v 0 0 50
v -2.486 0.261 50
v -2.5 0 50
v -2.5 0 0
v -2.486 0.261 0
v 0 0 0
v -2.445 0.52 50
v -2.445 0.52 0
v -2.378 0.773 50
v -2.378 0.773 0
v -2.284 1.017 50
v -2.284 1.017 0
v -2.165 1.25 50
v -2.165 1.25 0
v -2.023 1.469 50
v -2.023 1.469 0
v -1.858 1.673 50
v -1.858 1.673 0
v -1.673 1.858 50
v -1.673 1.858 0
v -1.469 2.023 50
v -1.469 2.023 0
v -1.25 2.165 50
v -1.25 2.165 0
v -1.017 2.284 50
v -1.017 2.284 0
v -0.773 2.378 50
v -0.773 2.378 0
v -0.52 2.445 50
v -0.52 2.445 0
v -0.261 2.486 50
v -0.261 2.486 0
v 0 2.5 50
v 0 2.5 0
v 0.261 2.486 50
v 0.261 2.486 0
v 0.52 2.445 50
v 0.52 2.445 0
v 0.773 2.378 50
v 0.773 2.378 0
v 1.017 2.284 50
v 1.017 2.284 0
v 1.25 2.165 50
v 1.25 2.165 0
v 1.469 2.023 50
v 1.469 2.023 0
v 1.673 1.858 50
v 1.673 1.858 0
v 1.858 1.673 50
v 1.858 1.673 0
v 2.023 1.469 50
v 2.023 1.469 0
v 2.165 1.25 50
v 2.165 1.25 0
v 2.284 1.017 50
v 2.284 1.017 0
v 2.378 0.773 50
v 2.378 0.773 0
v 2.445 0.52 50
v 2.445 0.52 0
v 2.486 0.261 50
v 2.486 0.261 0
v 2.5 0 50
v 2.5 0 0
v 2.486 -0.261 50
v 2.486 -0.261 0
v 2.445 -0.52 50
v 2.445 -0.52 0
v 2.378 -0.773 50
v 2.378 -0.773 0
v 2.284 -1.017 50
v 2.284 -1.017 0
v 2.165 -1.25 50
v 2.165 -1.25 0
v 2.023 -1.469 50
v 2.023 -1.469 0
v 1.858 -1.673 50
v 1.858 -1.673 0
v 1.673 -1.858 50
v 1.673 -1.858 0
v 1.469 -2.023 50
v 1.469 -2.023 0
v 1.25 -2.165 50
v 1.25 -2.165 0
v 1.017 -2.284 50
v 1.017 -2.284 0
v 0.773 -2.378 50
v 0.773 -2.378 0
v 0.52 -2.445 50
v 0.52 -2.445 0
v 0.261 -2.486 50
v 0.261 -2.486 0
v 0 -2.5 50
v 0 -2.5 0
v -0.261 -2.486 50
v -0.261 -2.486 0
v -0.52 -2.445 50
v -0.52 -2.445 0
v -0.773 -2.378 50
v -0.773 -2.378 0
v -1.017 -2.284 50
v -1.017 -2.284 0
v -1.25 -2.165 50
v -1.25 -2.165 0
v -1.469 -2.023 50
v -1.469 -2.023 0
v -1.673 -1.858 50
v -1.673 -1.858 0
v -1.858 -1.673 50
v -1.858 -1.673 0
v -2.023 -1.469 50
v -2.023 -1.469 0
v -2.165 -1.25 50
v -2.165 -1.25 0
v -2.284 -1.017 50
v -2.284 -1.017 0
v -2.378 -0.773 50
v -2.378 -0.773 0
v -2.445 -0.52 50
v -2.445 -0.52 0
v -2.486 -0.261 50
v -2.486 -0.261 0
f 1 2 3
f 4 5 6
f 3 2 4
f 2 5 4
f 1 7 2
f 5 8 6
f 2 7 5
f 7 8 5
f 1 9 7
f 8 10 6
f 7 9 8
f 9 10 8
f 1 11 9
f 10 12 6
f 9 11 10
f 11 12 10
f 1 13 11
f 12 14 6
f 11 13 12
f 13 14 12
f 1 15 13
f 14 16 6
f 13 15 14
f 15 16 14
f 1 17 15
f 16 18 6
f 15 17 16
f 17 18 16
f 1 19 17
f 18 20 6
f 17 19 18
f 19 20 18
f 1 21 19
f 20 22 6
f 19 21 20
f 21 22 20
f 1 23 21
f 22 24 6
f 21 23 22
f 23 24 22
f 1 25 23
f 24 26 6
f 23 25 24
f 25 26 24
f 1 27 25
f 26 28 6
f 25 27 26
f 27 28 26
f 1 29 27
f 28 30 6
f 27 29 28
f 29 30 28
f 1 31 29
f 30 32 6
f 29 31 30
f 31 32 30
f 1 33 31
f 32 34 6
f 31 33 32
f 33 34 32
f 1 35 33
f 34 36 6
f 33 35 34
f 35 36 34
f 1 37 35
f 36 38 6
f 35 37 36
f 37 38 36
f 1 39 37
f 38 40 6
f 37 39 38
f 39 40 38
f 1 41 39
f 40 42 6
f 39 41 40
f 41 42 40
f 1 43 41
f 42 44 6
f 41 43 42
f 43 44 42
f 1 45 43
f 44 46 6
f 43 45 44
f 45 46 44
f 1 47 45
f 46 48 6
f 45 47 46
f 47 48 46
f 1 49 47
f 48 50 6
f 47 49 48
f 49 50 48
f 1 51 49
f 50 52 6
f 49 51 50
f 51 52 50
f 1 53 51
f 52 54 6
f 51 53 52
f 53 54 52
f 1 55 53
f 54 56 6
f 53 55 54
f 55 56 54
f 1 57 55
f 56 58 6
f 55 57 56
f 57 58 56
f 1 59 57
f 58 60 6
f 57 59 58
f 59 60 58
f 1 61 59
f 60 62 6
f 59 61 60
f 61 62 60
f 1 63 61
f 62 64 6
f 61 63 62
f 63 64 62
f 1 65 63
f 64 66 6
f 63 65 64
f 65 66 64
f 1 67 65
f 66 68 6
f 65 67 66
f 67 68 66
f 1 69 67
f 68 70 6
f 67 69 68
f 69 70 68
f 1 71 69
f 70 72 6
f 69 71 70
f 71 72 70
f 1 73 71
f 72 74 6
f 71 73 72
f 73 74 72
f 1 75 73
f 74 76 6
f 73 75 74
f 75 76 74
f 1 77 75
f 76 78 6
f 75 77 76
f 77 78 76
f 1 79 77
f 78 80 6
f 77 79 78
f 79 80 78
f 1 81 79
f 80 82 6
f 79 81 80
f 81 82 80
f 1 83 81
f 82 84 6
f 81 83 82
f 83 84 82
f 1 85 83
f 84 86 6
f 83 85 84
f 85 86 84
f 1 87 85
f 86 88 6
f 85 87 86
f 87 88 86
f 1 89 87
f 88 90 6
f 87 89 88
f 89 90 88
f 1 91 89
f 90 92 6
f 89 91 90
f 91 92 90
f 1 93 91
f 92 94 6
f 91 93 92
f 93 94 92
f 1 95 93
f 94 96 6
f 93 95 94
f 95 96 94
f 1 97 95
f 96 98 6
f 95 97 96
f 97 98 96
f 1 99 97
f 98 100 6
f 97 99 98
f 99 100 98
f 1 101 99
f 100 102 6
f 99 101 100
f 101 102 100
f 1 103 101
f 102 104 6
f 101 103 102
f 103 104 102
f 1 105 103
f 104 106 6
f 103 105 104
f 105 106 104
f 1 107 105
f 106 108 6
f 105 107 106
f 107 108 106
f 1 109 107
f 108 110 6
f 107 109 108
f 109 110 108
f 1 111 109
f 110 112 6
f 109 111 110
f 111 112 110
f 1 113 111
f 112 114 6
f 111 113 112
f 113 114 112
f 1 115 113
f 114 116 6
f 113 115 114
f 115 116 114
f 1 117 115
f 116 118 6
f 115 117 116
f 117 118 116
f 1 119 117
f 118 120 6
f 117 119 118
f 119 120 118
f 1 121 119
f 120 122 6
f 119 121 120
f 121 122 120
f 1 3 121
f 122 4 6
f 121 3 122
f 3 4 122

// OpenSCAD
// Unit of length: Unit.MM
$fn = 60;

rotate_extrude(angle = 360.0)
{
   polygon(points = [[0.0, 50.0], [2.5, 50.0], [2.5, 0.0], [0.0, 0.0]]);
}
